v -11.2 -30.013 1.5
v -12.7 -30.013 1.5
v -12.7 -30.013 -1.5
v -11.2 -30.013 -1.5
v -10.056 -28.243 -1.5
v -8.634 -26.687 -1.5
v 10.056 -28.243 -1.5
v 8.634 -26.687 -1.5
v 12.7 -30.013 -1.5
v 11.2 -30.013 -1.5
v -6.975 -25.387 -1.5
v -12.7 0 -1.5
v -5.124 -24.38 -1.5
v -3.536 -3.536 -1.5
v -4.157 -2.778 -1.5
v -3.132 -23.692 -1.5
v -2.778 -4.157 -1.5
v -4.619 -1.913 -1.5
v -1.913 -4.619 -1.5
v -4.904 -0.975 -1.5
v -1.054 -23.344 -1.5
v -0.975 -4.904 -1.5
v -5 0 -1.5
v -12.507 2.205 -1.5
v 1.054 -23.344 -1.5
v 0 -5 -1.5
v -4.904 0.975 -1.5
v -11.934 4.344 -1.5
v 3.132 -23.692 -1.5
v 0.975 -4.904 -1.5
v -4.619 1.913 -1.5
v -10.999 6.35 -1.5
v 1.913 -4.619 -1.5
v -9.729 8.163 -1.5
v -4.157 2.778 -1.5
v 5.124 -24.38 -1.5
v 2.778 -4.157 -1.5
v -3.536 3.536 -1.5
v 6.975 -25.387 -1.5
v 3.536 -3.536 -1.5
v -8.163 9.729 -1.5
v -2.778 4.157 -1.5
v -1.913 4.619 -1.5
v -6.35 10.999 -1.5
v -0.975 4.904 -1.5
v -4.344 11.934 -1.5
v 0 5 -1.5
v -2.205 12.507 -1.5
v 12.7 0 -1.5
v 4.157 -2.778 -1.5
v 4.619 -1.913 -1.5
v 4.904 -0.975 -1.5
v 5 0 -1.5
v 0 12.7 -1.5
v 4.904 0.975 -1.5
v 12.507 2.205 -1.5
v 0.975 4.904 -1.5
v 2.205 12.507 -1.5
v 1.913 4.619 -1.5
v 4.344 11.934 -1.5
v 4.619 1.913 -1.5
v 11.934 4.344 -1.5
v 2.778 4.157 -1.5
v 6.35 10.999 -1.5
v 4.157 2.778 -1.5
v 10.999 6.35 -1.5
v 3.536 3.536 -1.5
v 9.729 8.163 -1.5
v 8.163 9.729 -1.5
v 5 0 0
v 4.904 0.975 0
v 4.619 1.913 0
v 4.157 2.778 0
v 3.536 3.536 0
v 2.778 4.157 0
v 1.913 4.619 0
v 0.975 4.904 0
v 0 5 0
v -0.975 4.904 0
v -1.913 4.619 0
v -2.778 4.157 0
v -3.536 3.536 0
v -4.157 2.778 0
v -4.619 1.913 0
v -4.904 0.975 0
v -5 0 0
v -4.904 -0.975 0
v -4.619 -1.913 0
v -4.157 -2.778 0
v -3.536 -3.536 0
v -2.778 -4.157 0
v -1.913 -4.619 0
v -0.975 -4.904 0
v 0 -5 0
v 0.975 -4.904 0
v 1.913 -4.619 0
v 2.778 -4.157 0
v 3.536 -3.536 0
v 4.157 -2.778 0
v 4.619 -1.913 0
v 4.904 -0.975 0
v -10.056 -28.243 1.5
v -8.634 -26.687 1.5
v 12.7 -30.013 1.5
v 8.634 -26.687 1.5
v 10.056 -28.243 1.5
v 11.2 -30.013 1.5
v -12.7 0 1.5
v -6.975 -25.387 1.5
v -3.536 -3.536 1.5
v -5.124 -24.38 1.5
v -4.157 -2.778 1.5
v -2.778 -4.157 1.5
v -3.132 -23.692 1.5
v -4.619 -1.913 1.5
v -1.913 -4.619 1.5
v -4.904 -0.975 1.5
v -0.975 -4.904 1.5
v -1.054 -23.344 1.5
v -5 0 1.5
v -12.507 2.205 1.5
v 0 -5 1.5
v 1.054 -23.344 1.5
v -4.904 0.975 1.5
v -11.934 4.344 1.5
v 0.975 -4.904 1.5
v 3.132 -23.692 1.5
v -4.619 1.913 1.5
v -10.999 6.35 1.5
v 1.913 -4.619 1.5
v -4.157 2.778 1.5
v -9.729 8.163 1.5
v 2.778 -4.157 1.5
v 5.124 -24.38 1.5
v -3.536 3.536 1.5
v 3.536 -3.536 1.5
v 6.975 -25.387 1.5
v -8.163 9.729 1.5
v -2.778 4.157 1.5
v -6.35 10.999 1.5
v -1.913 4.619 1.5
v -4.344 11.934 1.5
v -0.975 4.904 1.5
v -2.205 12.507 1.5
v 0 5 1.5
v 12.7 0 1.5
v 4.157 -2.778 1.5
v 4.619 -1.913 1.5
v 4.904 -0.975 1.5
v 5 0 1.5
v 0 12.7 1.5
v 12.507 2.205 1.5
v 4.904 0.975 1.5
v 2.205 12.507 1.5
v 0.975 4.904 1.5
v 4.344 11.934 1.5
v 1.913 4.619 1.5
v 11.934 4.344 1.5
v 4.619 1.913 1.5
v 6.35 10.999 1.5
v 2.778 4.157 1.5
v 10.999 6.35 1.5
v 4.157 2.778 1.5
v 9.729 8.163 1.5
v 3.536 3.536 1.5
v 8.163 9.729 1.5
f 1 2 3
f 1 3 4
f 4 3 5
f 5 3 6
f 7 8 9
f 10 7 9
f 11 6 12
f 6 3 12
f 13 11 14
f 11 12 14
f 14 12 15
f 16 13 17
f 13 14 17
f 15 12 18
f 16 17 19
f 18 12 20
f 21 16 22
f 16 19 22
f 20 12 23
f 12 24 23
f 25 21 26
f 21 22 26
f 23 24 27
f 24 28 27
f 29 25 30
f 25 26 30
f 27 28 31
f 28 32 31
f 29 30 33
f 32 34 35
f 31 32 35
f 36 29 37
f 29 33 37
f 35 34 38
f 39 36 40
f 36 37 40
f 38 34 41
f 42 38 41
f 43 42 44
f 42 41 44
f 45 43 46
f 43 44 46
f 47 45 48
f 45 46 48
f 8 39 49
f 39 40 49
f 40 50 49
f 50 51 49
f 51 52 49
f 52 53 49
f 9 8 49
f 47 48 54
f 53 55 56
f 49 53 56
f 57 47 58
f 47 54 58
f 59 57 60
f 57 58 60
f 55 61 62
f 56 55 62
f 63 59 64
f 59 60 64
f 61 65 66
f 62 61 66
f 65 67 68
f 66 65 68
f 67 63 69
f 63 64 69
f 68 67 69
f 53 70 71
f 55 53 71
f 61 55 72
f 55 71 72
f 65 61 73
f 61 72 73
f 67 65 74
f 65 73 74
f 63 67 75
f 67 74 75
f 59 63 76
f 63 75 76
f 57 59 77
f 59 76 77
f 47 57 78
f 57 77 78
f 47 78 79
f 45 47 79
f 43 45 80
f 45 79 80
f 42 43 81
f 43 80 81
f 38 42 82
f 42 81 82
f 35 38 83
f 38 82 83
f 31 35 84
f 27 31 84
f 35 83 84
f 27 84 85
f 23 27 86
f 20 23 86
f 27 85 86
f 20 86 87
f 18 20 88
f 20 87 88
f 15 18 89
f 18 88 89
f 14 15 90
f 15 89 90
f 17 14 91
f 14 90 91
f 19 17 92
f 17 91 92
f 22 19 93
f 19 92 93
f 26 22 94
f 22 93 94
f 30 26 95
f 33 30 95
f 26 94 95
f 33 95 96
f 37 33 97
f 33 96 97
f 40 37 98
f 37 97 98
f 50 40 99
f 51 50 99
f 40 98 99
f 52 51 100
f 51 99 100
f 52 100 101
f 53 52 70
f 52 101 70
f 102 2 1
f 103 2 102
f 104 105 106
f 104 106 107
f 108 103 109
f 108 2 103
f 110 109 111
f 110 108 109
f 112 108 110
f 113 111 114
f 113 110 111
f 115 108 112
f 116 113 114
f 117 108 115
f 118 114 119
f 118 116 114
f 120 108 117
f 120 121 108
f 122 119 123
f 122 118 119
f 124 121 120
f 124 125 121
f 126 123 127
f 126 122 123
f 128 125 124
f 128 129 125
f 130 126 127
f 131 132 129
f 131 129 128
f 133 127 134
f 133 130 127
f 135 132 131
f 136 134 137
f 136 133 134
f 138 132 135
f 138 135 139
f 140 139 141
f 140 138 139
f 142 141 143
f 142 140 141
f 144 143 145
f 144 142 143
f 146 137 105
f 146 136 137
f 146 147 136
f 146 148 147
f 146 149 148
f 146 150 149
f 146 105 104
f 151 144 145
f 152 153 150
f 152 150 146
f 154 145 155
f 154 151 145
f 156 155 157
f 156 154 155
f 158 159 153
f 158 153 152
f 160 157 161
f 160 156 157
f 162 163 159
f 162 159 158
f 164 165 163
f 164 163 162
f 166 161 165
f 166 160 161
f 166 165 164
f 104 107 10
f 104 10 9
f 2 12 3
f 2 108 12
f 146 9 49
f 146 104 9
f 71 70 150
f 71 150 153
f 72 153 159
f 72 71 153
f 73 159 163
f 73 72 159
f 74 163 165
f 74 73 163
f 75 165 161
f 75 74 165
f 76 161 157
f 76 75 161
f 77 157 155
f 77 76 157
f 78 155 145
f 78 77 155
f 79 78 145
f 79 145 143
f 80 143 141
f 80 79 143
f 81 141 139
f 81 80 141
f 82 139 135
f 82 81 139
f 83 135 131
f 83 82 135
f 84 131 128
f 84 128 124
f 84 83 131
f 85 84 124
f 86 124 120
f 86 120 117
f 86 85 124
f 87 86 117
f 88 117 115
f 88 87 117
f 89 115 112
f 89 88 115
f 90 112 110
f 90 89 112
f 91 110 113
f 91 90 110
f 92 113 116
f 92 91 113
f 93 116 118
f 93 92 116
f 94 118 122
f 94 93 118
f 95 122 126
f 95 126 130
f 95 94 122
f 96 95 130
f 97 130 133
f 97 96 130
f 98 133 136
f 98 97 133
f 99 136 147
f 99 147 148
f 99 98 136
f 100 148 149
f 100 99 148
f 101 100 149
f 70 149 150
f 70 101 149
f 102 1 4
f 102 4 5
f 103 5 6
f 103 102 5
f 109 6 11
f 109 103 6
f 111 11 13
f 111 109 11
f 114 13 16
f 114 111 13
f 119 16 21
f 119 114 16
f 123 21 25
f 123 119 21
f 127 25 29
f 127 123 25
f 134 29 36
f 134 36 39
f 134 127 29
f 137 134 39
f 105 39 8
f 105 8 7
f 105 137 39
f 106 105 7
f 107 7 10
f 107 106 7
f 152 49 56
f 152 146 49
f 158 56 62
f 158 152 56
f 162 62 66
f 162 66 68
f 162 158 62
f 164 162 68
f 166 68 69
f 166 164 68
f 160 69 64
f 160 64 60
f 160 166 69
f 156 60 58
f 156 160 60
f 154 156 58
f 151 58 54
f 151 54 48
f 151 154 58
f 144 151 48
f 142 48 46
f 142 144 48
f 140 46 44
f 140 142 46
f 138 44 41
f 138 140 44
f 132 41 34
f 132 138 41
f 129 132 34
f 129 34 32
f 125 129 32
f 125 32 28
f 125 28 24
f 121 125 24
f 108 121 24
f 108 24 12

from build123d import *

# Parameters (mm, degrees)
BOSS_EXTRUDE1_DEPTH      = 1.5
BOSS_EXTRUDE1_DEPTH_BACK = 1.5
SKETCH1_R                = 5


with BuildPart() as part:
    # Sketch1 → Boss-Extrude1 (new, two sides: drawn at the far end of the back side and taken through both)
    with BuildSketch(Plane.XY.offset(-BOSS_EXTRUDE1_DEPTH_BACK)):
        with BuildLine():
            Line((-12.7, 0), (-12.7, -30.012513048))
            Line((-12.7, -30.012513048), (-11.2, -30.012513048))
            ThreePointArc((-11.2, -30.012513048), (0, -23.3), (11.2, -30.012513048))
            Line((11.2, -30.012513048), (12.7, -30.012513048))
            Line((12.7, -30.012513048), (12.7, 0))
            ThreePointArc((12.7, 0), (0, 12.7), (-12.7, 0))
        make_face()
        Circle(SKETCH1_R, mode=Mode.SUBTRACT)
    extrude(amount=BOSS_EXTRUDE1_DEPTH + BOSS_EXTRUDE1_DEPTH_BACK)


solid = part.part
